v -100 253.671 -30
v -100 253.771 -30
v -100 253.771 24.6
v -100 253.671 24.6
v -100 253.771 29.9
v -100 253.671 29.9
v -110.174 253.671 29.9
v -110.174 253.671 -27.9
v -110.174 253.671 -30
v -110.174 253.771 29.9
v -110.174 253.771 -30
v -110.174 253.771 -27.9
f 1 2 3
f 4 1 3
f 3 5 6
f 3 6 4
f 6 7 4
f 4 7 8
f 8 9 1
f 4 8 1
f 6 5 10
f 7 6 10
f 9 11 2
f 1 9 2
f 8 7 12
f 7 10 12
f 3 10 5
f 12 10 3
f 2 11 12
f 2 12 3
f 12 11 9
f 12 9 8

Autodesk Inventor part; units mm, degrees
ref_plane "YZ Plane" through (0, 0, 0) normal (1, 0, 0) x (0, 1, 0)
ref_plane "XZ Plane" through (0, 0, 0) normal (0, 1, 0) x (-1, 0, 0)
ref_plane "XY Plane" through (0, 0, 0) normal (0, 0, 1) x (1, 0, 0)
surface "Composite1"
sketch "Sketch1" plane through (-100, 253.7713, 21.8) normal (0, 1, 0) x (1, 0, 0)
  line L0 (-10.1736, 51.8) -> (-10.1736, 49.7) projected
  line L1 (0, -8.1) -> (0, -2.8) projected
  line L2 (-10.1736, 51.8) -> (0, 51.8)
  line L3 (0, 51.8) -> (0, -8.1)
  line L4 (0, -8.1) -> (-10.1736, -8.1)
  line L5 (-10.1736, -8.1) -> (-10.1736, 51.8)
  point P0 (100, 21.8)
extrude "Extrusion1" add sketch "Sketch1" against normal blind 0.1
properties part number "Surface 5" material "PC/ABS Plastic"
